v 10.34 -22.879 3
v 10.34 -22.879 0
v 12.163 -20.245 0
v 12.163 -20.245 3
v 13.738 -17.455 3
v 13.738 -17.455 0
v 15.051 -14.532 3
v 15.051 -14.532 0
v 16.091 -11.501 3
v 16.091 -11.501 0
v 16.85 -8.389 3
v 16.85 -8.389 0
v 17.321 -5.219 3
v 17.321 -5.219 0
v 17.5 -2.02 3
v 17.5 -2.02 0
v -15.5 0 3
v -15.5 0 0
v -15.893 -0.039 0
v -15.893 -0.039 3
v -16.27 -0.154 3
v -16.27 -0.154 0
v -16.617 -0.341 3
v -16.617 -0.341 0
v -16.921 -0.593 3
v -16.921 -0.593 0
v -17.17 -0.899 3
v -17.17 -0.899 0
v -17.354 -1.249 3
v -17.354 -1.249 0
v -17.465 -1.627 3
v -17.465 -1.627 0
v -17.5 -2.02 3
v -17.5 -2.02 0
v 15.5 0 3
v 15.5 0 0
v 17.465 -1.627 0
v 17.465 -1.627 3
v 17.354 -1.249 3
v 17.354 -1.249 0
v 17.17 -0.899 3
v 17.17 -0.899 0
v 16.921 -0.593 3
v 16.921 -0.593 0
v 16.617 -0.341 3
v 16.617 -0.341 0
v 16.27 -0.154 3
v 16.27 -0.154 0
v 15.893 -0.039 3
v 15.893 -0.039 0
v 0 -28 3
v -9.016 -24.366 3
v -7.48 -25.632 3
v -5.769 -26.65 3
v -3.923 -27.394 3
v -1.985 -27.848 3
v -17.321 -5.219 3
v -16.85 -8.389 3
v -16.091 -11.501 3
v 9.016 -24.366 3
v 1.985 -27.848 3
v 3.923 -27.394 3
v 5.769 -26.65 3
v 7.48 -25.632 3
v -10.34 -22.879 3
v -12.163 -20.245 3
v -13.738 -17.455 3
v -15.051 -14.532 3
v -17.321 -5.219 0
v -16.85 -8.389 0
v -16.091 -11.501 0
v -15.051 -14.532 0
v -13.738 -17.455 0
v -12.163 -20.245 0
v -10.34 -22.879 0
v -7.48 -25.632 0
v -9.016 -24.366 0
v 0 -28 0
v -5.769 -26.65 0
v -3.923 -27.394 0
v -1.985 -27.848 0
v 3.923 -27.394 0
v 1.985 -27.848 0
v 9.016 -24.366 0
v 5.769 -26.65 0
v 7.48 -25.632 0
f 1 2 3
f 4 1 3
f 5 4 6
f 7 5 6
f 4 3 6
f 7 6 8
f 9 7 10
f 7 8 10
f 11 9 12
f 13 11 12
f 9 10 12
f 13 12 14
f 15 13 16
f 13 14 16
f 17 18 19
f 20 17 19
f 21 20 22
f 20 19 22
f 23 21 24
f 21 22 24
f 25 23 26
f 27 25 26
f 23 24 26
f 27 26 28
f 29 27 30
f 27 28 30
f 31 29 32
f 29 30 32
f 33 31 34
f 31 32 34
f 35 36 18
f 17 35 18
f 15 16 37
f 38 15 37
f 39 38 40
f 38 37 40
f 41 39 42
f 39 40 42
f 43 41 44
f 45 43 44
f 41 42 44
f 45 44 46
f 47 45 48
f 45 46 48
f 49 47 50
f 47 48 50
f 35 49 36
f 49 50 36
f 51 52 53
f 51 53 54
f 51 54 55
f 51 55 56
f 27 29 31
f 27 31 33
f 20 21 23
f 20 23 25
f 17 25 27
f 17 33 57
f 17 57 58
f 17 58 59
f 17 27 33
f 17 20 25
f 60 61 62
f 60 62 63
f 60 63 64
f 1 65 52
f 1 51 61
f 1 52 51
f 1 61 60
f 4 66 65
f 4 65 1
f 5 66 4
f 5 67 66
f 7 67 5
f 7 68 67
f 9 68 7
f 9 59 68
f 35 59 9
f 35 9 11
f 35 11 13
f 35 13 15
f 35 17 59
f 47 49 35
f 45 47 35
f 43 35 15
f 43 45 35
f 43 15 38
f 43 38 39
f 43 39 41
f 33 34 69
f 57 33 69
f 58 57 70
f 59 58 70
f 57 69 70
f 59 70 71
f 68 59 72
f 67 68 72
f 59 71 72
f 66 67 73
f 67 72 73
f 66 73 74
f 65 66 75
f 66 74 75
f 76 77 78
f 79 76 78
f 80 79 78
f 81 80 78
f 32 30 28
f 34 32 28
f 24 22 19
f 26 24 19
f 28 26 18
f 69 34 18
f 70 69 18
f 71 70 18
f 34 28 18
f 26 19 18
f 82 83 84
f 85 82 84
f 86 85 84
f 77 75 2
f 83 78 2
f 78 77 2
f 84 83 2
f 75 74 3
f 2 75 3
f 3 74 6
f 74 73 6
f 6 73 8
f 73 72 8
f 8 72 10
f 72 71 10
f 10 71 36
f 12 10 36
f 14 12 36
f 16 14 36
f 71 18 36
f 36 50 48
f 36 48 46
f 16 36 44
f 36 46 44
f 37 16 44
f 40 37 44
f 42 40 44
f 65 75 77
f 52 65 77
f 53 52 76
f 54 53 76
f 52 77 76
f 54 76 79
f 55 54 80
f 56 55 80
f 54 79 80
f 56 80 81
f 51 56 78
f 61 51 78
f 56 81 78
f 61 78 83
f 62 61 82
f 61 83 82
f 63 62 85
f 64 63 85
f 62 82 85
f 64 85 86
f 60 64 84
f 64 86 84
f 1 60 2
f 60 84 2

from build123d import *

# Parameters (mm, degrees)
F1_DEPTH = 3


with BuildPart() as f1:
    # F0 (on Top) → F1 (new body)
    with BuildSketch(Plane.XY):
        with BuildLine():
            Line((0, 0), (-15.5, 0))
            ThreePointArc((-15.5, 0), (-16.921363, -0.592973), (-17.499897, -2.020274))
            ThreePointArc((-17.499897, -2.020274), (-15.60578, -13.028563), (-10.339907, -22.879487))
            ThreePointArc((-10.339907, -22.879487), (0, -28), (10.339907, -22.879487))
            ThreePointArc((10.339907, -22.879487), (15.60578, -13.028563), (17.499897, -2.020274))
            ThreePointArc((17.499897, -2.020274), (16.921363, -0.592973), (15.5, 0))
            Line((15.5, 0), (0, 0))
        make_face()
    extrude(amount=F1_DEPTH)


solid = f1.part
